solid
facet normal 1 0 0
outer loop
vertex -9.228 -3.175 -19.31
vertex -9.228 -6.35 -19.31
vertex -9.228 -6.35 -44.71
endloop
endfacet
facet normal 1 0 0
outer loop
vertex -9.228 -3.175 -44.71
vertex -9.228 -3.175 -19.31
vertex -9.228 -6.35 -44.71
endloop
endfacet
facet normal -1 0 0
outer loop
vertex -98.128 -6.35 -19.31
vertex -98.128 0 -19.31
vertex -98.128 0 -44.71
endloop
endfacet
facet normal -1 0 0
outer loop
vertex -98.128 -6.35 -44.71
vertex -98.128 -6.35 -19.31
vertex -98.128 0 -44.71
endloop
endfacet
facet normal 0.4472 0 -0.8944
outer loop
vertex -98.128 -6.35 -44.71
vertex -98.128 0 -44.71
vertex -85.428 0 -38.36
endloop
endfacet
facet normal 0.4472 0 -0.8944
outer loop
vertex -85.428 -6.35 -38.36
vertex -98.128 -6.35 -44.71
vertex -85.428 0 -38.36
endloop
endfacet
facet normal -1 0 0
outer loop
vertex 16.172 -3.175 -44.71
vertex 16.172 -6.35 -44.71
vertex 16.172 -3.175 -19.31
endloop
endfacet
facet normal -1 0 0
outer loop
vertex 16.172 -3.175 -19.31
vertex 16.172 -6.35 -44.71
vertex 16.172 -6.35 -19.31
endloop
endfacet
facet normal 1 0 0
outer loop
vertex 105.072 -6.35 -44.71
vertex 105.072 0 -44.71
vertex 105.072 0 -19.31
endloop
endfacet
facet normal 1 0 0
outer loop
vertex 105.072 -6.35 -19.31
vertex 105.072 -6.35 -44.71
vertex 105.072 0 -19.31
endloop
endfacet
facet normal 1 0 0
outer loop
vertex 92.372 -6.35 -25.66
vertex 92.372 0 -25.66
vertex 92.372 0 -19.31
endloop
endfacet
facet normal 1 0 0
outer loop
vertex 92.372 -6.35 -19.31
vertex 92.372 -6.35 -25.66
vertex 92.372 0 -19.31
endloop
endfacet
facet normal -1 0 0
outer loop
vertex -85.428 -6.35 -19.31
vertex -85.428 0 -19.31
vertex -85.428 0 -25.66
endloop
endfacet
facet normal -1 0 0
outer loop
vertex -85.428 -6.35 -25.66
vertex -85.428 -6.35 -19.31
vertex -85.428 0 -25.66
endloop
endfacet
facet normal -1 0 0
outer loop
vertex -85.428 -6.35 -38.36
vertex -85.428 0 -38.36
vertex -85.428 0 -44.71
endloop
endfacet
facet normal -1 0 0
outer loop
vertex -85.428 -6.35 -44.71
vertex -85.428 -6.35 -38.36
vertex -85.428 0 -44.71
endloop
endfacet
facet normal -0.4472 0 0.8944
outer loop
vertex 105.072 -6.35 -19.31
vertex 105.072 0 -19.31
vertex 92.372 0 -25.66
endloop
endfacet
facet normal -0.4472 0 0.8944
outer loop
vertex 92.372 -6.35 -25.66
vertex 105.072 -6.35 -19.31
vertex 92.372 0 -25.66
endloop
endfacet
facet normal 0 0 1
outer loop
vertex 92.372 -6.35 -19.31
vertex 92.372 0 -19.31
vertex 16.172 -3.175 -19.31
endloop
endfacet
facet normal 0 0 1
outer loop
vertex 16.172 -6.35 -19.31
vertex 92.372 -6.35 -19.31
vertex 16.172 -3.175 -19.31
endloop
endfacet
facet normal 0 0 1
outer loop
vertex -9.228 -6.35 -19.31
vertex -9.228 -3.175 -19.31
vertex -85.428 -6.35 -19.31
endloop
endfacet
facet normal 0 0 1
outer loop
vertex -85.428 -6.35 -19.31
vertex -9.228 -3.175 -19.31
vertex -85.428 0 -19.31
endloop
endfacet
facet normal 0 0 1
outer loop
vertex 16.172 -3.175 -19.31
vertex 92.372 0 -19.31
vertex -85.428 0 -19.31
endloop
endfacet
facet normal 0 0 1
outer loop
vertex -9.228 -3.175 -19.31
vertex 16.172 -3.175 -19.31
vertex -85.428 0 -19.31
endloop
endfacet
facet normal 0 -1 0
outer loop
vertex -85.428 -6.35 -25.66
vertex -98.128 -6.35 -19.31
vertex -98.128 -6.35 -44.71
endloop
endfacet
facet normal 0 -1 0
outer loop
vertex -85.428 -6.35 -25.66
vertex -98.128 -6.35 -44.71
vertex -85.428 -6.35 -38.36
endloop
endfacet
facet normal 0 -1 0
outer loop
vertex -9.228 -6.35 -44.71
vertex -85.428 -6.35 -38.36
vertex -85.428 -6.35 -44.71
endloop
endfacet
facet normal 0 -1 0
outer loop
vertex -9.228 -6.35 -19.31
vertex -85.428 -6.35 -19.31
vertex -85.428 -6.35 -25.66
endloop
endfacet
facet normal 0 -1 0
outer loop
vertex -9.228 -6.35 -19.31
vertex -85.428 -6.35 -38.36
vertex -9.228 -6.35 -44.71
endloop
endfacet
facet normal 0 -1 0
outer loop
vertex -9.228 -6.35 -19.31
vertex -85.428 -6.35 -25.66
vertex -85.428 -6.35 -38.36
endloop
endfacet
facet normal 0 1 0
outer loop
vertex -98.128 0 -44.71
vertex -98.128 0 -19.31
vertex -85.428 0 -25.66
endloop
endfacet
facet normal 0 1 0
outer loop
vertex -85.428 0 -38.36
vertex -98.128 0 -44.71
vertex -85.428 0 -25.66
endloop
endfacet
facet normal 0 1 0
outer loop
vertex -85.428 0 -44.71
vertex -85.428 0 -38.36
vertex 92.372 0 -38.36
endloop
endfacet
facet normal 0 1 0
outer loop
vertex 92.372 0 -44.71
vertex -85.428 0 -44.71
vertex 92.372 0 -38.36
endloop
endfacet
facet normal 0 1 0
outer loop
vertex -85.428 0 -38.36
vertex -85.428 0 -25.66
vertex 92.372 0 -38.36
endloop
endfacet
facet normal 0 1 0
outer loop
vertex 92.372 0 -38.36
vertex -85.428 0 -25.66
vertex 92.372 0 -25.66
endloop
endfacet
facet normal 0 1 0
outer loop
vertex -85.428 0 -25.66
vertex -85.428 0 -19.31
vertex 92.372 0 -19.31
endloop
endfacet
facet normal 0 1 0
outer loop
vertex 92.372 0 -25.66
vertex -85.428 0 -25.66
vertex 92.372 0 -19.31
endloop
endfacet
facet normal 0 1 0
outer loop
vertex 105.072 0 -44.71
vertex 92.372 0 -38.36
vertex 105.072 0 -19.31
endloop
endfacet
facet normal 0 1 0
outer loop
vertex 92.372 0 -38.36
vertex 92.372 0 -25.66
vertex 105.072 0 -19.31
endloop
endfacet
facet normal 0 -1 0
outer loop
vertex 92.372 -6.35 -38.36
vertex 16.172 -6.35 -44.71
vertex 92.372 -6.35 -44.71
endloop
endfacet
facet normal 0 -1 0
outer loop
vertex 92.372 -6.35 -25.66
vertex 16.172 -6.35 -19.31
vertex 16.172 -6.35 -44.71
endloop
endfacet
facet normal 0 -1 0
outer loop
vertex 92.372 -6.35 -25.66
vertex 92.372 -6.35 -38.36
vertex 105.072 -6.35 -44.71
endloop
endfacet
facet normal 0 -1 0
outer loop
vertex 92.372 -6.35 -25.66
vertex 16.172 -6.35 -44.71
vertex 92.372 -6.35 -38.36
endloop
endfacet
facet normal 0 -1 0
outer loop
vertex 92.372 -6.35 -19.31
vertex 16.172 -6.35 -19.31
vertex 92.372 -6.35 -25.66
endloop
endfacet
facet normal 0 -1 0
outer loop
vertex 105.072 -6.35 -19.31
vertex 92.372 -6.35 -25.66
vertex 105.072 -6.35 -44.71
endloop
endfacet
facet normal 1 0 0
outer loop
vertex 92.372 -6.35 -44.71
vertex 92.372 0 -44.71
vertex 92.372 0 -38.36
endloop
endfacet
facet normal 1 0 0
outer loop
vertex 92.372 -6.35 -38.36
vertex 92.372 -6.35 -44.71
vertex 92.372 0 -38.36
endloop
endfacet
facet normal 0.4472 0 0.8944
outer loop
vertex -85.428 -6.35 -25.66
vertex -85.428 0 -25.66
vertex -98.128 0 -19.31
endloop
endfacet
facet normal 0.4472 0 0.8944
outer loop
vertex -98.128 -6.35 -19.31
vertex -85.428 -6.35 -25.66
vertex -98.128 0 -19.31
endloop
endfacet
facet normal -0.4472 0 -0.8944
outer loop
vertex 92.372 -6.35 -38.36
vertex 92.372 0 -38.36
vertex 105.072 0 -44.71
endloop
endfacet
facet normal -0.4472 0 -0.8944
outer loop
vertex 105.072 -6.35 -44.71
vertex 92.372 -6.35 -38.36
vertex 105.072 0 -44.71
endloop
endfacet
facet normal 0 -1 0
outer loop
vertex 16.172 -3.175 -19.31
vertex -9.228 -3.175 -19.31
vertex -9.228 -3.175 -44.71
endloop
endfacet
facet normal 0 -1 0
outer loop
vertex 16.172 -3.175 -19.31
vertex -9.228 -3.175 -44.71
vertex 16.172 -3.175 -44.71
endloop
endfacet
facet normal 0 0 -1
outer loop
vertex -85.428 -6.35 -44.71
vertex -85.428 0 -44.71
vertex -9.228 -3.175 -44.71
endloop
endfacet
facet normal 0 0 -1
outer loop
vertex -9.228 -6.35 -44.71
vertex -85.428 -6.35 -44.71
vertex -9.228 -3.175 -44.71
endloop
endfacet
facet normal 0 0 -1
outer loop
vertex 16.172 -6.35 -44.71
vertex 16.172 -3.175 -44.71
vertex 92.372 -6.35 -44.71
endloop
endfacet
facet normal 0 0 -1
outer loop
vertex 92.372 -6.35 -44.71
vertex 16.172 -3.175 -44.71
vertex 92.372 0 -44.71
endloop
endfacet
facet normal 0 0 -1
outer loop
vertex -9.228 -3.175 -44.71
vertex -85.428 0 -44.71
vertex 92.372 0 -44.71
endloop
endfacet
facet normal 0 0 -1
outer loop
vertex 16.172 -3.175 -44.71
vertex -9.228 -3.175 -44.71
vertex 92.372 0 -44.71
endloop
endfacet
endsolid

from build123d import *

# Parameters (mm, degrees)
F1_DEPTH = 6.35
F3_DEPTH = 3.175


with BuildPart() as f1:
    # F0 (on Front) → F1 (new body)
    with BuildSketch(Plane.XZ):
        Polygon((-85.428059, -25.659776), (-98.128059, -19.309776), (-98.128059, -44.709776), (-85.428059, -38.359776), (-85.428059, -44.709776), (92.371941, -44.709776), (92.371941, -38.359776), (105.071941, -44.709776), (105.071941, -19.309776), (92.371941, -25.659776), (92.371941, -19.309776), (-85.428059, -19.309776), align=None)
    extrude(amount=F1_DEPTH)

    # F2 (on face) → F3 (cut)
    with BuildSketch(Plane.XZ.offset(6.35)):
        Polygon((16.171941, -19.309776), (-9.228059, -19.309776), (-9.228059, -32.009776), (-9.228059, -44.709776), (16.171941, -44.709776), (16.171941, -32.009776), align=None)
    extrude(amount=-F3_DEPTH, mode=Mode.SUBTRACT)


solid = f1.part
